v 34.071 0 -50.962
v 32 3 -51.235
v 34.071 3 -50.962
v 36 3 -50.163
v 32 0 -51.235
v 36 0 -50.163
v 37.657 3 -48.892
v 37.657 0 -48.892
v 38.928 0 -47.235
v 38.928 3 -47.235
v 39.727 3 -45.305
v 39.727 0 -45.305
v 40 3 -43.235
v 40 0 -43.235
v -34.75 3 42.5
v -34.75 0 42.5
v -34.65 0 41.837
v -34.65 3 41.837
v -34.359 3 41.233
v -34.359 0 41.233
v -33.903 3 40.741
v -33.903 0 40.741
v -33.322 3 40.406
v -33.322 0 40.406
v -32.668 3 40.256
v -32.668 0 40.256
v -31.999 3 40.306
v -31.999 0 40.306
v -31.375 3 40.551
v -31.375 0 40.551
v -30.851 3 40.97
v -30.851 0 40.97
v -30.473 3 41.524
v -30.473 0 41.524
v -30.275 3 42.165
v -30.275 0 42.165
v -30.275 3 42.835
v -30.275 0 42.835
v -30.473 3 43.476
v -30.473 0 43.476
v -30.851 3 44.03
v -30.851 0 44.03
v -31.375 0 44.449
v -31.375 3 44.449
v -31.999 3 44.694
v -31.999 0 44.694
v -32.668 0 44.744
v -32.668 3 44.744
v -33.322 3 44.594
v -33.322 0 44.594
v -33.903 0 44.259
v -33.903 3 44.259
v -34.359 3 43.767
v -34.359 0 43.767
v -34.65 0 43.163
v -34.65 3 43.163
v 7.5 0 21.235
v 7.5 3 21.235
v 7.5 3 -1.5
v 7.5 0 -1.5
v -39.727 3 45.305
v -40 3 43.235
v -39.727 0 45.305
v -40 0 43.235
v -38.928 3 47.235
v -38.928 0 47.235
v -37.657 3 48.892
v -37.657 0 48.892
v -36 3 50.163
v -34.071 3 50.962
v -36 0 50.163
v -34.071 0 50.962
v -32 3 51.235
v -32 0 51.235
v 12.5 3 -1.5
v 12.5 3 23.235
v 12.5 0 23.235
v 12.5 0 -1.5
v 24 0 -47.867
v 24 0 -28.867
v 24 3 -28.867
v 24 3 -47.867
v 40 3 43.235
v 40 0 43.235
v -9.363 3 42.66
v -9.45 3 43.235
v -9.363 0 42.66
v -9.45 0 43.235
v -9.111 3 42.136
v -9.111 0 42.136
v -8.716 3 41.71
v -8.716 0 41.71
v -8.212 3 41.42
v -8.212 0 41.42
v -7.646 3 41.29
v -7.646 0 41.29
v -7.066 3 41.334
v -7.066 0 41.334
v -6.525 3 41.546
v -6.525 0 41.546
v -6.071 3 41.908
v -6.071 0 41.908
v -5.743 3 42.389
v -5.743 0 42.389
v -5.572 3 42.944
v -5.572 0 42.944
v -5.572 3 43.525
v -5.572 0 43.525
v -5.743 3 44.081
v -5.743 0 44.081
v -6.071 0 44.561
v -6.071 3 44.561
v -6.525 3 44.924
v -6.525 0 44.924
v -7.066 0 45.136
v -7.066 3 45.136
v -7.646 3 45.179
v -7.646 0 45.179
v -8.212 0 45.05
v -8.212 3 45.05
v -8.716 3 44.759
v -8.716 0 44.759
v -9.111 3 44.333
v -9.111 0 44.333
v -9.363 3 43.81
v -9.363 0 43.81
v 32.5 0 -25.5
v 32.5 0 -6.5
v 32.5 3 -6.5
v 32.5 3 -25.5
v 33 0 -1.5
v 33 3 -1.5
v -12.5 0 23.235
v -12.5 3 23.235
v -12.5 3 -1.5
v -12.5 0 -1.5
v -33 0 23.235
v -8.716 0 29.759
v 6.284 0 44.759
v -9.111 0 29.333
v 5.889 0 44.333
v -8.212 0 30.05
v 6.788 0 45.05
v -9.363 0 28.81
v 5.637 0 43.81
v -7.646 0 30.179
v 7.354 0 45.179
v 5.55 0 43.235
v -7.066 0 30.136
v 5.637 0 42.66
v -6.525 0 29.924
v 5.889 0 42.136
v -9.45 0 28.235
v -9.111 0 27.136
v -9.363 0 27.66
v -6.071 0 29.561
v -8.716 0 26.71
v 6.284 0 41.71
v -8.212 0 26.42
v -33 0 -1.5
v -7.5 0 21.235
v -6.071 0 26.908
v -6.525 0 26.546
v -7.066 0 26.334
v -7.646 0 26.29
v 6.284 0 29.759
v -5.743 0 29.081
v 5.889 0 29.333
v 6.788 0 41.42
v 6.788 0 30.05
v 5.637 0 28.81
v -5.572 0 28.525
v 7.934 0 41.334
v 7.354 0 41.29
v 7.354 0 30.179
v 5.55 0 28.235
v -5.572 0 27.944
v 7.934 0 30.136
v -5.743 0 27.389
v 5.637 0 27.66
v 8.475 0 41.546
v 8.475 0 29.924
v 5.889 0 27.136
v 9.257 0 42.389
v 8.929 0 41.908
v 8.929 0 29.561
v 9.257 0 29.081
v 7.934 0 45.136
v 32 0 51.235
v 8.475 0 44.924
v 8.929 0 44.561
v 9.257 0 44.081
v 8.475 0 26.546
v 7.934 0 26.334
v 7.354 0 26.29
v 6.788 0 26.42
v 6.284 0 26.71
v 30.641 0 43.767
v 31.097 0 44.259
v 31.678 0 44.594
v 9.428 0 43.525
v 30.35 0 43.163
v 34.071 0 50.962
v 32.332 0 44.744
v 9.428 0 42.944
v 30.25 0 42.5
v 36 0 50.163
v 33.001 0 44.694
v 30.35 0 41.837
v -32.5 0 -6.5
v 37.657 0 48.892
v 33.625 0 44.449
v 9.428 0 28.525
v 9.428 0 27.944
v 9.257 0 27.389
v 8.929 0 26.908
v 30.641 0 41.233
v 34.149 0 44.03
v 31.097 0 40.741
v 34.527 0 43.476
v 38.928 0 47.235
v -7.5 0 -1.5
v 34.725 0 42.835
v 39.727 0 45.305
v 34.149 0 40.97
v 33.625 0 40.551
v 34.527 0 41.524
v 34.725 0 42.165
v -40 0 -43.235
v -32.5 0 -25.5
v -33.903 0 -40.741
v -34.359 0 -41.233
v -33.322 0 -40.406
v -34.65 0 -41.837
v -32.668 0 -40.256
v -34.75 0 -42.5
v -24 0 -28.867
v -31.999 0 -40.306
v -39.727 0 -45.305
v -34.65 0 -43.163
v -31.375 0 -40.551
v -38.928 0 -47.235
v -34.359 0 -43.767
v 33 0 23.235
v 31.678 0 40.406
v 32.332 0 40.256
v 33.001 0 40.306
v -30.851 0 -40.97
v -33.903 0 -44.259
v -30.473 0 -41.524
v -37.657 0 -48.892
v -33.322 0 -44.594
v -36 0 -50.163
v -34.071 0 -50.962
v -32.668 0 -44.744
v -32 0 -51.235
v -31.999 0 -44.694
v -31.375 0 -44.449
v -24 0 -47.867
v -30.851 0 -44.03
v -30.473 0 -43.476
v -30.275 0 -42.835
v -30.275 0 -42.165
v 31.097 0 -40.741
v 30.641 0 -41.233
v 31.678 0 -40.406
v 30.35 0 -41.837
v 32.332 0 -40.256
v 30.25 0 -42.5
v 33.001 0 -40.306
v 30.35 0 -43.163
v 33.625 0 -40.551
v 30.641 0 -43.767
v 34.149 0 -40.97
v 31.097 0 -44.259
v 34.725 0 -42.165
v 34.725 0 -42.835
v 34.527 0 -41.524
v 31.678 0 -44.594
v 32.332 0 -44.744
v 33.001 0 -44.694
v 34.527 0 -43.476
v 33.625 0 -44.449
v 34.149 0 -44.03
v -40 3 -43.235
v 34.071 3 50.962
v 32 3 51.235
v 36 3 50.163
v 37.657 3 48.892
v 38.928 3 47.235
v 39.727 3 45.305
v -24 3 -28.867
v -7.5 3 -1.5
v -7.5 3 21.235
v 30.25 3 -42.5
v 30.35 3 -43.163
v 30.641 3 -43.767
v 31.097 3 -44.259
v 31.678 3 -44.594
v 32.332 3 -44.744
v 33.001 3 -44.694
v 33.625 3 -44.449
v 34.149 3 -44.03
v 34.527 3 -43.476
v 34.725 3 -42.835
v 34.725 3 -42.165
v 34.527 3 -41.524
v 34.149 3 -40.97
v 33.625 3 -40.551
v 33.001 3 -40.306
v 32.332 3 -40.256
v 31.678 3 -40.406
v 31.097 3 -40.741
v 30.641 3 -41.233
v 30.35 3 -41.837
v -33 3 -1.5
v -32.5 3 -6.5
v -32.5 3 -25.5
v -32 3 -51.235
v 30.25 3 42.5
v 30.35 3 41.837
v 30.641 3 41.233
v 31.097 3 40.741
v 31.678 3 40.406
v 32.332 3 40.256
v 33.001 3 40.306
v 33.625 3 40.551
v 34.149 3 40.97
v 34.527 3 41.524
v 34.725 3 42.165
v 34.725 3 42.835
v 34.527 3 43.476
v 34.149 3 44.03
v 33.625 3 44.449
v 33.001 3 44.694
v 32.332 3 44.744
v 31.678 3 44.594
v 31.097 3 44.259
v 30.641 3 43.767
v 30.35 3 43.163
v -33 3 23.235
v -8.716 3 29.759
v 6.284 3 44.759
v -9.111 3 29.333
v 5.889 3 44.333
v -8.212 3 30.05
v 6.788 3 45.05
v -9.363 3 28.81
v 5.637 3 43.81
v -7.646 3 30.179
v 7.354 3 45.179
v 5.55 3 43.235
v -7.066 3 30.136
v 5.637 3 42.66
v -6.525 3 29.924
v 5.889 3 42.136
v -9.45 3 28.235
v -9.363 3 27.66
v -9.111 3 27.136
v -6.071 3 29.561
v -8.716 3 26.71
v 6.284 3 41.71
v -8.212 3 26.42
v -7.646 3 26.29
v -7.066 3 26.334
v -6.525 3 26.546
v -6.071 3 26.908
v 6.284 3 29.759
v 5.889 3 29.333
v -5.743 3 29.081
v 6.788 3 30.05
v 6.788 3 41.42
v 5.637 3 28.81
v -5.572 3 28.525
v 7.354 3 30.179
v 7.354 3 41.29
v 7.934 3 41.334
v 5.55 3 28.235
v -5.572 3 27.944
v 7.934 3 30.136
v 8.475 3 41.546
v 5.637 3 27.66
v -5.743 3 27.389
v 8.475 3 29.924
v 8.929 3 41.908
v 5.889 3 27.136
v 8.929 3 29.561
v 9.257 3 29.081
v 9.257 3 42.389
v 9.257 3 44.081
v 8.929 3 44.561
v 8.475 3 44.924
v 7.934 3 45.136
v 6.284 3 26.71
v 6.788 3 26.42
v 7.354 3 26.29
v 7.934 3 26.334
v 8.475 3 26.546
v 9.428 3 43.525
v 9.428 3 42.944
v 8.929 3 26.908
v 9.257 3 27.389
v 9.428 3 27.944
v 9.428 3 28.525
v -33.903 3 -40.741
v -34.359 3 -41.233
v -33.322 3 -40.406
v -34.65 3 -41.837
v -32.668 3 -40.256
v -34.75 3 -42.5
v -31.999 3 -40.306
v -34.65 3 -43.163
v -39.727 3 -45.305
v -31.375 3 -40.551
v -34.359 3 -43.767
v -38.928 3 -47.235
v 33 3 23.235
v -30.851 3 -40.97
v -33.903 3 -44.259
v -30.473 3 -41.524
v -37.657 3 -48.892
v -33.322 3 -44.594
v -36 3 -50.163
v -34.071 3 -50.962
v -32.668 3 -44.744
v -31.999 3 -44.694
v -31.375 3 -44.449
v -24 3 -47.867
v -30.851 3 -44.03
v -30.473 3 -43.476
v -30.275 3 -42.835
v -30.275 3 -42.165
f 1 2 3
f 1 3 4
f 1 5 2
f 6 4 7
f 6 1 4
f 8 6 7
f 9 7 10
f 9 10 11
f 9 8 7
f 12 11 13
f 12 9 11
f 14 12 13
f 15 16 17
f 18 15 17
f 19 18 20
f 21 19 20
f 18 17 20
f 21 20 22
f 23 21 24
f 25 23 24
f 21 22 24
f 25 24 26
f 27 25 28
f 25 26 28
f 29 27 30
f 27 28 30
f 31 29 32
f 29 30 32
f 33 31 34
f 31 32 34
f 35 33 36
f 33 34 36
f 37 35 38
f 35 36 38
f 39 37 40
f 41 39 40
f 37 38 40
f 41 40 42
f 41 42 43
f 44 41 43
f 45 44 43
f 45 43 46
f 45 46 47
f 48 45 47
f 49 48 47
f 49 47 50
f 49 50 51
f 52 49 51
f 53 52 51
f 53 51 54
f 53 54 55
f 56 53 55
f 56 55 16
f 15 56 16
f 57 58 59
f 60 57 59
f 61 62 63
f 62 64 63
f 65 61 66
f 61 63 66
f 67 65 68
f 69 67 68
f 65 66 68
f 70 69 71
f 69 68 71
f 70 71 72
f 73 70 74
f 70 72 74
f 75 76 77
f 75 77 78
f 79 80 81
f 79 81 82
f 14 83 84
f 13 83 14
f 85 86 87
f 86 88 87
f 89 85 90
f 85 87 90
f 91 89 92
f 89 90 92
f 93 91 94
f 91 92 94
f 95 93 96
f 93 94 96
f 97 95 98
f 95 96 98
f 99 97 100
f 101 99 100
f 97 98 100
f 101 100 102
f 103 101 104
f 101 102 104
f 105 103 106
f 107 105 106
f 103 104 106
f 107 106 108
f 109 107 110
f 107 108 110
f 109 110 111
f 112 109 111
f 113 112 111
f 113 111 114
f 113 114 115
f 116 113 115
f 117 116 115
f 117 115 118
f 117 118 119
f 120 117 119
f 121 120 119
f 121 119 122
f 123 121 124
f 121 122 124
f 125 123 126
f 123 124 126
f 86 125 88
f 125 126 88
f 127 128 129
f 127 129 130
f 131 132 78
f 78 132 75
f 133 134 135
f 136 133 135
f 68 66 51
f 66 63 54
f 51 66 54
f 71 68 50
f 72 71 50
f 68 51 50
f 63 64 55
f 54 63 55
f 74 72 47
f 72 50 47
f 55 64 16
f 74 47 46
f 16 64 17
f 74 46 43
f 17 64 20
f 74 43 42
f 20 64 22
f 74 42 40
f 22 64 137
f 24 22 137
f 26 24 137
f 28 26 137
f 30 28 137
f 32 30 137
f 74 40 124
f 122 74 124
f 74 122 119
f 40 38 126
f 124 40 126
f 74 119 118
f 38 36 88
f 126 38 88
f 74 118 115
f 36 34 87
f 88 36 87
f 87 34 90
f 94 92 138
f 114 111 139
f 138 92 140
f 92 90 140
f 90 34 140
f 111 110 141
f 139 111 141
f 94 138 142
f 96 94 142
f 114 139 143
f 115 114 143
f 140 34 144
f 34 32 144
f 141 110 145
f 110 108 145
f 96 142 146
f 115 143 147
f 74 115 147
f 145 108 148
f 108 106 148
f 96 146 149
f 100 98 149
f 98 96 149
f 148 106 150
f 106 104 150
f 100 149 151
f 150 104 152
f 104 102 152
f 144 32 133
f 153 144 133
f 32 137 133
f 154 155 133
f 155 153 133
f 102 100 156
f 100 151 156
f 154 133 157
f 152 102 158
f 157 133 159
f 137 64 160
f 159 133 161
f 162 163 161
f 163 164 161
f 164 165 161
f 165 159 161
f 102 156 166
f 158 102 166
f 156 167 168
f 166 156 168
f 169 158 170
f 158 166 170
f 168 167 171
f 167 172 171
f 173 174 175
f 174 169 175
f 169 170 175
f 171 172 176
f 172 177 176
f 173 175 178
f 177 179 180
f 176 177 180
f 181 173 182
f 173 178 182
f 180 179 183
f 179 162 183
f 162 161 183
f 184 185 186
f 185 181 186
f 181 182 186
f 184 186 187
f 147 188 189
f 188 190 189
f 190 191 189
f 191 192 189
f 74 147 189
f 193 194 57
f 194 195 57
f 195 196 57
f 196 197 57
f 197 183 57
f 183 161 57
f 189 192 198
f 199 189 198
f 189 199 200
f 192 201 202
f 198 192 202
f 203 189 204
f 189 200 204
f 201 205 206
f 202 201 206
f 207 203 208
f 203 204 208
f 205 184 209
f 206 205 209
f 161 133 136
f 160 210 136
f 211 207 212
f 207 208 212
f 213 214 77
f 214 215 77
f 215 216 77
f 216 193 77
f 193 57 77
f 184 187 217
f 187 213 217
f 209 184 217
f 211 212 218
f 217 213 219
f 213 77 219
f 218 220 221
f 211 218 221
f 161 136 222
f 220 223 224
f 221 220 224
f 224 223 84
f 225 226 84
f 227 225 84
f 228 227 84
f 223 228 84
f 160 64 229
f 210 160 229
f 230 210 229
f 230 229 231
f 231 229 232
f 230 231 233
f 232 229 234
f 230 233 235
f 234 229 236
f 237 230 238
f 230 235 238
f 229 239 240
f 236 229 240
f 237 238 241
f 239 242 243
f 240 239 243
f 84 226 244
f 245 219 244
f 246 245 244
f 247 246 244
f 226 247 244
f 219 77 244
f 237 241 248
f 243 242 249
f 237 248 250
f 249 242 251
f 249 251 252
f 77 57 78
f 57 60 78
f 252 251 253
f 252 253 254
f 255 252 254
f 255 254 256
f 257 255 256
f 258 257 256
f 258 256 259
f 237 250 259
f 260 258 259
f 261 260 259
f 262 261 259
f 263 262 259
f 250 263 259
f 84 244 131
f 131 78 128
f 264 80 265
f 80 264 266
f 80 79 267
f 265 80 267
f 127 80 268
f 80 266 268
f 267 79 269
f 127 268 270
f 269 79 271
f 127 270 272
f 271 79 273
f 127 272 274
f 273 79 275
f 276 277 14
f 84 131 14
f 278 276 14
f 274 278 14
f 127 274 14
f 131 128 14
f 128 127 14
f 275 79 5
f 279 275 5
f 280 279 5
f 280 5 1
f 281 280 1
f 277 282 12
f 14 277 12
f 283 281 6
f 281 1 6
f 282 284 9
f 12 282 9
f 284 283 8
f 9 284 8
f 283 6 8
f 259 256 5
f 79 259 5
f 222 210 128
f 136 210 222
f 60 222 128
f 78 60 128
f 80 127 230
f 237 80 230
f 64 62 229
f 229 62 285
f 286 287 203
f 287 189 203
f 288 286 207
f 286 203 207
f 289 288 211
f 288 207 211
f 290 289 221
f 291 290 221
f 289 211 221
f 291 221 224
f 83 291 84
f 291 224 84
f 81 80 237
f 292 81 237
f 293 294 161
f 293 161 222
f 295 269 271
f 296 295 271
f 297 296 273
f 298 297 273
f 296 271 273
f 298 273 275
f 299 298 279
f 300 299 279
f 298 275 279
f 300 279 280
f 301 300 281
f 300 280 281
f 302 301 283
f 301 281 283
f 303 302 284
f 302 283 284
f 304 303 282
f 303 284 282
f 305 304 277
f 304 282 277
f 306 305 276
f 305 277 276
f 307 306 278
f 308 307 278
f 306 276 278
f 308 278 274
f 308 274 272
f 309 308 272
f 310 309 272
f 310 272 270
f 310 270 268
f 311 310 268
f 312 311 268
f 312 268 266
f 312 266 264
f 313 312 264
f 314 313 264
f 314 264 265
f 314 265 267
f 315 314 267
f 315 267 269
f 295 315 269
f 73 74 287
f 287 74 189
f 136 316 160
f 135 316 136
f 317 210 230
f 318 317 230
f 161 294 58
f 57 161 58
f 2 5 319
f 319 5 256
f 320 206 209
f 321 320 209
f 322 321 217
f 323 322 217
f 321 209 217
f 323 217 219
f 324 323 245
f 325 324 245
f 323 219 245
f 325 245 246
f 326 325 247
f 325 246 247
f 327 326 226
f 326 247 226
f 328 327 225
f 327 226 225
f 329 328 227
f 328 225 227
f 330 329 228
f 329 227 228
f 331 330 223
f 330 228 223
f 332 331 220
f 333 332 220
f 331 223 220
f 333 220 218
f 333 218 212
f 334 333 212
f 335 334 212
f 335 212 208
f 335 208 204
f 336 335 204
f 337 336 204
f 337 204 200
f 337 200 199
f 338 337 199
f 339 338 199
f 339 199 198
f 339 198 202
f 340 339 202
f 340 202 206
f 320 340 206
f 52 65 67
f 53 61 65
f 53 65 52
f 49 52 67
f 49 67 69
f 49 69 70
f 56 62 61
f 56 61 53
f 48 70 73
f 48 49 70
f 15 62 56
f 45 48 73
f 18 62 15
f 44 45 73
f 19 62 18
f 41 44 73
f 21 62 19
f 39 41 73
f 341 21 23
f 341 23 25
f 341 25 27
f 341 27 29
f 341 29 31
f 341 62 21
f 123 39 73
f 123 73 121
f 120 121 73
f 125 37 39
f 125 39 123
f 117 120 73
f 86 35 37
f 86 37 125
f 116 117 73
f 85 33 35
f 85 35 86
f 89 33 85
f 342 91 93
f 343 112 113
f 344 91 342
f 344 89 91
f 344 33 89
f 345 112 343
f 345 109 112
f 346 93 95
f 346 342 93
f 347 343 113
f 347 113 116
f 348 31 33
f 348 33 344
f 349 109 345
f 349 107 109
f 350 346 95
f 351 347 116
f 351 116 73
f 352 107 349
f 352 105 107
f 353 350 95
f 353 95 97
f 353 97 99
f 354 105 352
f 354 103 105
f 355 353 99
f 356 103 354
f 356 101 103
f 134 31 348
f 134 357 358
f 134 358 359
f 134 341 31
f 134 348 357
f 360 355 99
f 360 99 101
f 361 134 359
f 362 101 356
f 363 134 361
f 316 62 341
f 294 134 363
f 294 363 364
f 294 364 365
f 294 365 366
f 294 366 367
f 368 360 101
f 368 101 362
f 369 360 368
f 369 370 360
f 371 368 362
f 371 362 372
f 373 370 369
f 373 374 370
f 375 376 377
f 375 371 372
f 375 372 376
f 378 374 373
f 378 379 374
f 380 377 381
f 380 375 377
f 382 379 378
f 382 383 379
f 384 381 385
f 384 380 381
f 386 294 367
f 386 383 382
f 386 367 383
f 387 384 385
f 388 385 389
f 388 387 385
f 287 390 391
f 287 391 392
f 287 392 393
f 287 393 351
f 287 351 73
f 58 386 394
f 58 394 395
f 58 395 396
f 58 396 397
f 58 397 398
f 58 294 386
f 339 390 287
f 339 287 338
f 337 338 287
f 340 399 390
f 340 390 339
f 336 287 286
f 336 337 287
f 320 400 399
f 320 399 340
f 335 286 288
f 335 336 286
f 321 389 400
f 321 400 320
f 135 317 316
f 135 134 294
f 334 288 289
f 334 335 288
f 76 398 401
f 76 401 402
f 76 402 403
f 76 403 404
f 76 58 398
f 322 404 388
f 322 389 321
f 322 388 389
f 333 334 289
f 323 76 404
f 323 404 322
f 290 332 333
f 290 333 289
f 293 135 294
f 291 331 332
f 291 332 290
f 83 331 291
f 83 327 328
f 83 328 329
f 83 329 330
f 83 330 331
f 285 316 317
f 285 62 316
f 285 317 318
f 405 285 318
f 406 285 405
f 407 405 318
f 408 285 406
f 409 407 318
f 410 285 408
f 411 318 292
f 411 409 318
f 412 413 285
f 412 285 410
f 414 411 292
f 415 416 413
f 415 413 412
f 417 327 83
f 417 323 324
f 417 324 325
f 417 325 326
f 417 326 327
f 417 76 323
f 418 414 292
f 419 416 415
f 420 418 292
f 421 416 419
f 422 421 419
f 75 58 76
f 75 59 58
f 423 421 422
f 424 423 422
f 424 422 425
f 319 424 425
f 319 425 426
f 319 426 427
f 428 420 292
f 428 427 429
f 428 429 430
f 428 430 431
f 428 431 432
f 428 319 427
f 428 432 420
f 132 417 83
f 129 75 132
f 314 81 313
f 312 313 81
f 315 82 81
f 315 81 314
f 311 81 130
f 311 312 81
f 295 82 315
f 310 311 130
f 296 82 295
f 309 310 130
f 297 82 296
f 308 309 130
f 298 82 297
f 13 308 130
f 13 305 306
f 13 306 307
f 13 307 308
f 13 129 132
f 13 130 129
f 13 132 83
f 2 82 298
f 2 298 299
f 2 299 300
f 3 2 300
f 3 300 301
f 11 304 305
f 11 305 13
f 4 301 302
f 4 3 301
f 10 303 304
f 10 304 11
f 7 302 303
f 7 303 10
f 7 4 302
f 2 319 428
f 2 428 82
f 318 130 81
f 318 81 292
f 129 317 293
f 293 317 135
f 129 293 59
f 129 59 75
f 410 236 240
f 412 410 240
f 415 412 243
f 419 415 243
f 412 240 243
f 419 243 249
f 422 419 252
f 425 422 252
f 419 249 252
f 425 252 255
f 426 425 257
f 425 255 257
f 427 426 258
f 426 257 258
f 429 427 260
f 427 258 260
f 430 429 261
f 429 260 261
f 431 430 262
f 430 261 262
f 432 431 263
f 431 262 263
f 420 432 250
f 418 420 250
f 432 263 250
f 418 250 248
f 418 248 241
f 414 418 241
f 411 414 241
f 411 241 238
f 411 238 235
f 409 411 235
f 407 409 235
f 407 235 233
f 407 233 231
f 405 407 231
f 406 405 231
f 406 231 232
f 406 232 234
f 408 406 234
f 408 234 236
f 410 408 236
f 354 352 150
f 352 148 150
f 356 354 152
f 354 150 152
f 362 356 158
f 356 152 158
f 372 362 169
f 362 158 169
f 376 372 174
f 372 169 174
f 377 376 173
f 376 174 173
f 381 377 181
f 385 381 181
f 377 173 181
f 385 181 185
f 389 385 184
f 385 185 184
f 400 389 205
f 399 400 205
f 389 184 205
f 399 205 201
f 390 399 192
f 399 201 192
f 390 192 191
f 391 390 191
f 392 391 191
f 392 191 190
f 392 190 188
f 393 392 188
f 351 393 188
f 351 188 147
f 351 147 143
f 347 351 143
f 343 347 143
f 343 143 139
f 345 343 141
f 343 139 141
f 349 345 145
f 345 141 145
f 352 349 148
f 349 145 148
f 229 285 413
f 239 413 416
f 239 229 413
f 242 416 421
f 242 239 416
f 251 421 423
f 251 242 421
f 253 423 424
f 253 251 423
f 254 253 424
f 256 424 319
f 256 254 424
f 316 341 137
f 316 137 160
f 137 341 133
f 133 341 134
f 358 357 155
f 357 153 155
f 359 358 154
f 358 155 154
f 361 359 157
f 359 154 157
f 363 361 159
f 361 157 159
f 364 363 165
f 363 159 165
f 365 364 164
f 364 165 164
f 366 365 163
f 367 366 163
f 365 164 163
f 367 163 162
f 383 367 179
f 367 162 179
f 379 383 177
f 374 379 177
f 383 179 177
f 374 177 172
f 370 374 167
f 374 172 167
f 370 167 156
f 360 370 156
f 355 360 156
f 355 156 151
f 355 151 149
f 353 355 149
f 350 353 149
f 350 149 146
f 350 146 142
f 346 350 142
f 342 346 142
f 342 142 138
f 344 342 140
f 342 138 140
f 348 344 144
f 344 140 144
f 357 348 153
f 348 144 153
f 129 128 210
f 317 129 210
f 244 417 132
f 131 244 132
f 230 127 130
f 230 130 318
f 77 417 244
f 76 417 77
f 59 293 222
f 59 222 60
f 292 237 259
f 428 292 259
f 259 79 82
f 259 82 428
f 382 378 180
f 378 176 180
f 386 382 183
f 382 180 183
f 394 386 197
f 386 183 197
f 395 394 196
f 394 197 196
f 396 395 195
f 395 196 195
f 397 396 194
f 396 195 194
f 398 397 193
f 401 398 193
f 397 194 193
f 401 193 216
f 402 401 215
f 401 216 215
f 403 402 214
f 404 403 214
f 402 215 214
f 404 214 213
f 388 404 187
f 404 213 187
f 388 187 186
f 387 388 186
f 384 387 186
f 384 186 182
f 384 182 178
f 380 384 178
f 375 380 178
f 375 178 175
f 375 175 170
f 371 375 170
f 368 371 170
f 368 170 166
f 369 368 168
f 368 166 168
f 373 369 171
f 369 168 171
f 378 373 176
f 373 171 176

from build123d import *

# Parameters (mm, degrees)
ESQUISSE1_R             = 65
DISQUE_DEPTH            = 3
ESQUISSE3_W             = 30.466369815
ESQUISSE3_H             = 200
COT_S_DEPTH             = 4
D_GAGEMENT_M42_D        = 4.5
ESQUISSE15_W            = 89.863216067
ESQUISSE15_H            = 32.096215679
ENL_V_MAT_EXTRU_1_DEPTH = 4
EMPLACEMENT_COMPOS_W    = 48
EMPLACEMENT_COMPOS_H    = 19
EMPLACEMENT_COMPOS_W_2  = 65
EMPLACEMENT_COMPOS_W_3  = 120.200529509
EMPLACEMENT_COMPOS_H_2  = 30.626013932
ENL_V_MAT_EXTRU_2_DEPTH = 4
CONG_1_R                = 8
D_GAGEMENT_M3_51_D      = 3.9
D_GAGEMENT_M3_51_DEPTH  = 3
D_GAGEMENT_M3_51_TIP    = 1.171678207
ESQUISSE19_W            = 20.5
ESQUISSE19_H            = 24.73475383
ENL_V_MAT_EXTRU_3_DEPTH = 4
ESQUISSE22_W            = 15
ESQUISSE22_H            = 22.73475383
ENL_V_MAT_EXTRU_4_DEPTH = 4


with BuildPart() as part:
    # Esquisse1 → disque (new body)
    with BuildSketch(Plane(origin=(0, 0, 0), x_dir=(1, 0, 0), z_dir=(0, 1, 0))):
        Circle(ESQUISSE1_R)
    extrude(amount=DISQUE_DEPTH)

    # Esquisse3 → cotés (cut, through all)
    with BuildSketch(Plane(origin=(0, 3, 0), x_dir=(1, 0, 0), z_dir=(0, 1, 0))):
        with Locations((-55.233184908, 0)):
            Rectangle(ESQUISSE3_W, ESQUISSE3_H)
        with Locations((55.233184908, 0)):
            Rectangle(ESQUISSE3_W, ESQUISSE3_H)
    extrude(amount=-COT_S_DEPTH, mode=Mode.SUBTRACT)

    # Dégagement M42 (through all)
    with Locations(Plane(origin=(0, 3, 0), x_dir=(1, 0, 0), z_dir=(0, 1, 0))):
        with Locations((-32.5, 42.5), (32.5, 42.5), (32.5, -42.5), (-32.5, -42.5)):
            Hole(D_GAGEMENT_M42_D / 2)

    # Esquisse15 → Enlèv. mat.-Extru.1 (cut, through all)
    with BuildSketch(Plane.XZ):
        with Locations((-4.931608034, 67.282861669)):
            Rectangle(ESQUISSE15_W, ESQUISSE15_H)
    extrude(amount=-ENL_V_MAT_EXTRU_1_DEPTH, mode=Mode.SUBTRACT)

    # emplacement compos → Enlèv. mat.-Extru.2 (cut, through all)
    with BuildSketch(Plane(origin=(0, 0, 0), x_dir=(-1, 0, 0), z_dir=(0, -1, 0))):
        with Locations((0, 38.367376915)):
            Rectangle(EMPLACEMENT_COMPOS_W, EMPLACEMENT_COMPOS_H)
        with Locations((0, 16)):
            Rectangle(EMPLACEMENT_COMPOS_W_2, EMPLACEMENT_COMPOS_H)
        with Locations((-20.100264755, 66.547760796)):
            Rectangle(EMPLACEMENT_COMPOS_W_3, EMPLACEMENT_COMPOS_H_2)
    extrude(amount=-ENL_V_MAT_EXTRU_2_DEPTH, mode=Mode.SUBTRACT)

    # Congé1
    cong_1_edges = [part.edges().sort_by_distance(p)[0] for p in [
        (40, 1.5, -51.23475383),
        (40, 1.5, 51.23475383),
        (-40, 1.5, 51.23475383),
        (-40, 1.5, -51.23475383),
    ]]
    fillet(cong_1_edges, radius=CONG_1_R)

    # Dégagement M3.51
    with Locations(Plane(origin=(0, 3, 0), x_dir=(1, 0, 0), z_dir=(0, 1, 0))):
        with Locations((-7.5, -28.23475383), (7.5, -28.23475383), (7.5, -43.23475383), (-7.5, -43.23475383)):
            Hole(D_GAGEMENT_M3_51_D / 2, depth=D_GAGEMENT_M3_51_DEPTH)
            with Locations((0, 0, -(D_GAGEMENT_M3_51_DEPTH + D_GAGEMENT_M3_51_TIP / 2))):  # 118° drill point
                Cone(0, D_GAGEMENT_M3_51_D / 2, D_GAGEMENT_M3_51_TIP, mode=Mode.SUBTRACT)

    # Esquisse19 → Enlèv. mat.-Extru.3 (cut, through all)
    with BuildSketch(Plane(origin=(0, 3, 0), x_dir=(1, 0, 0), z_dir=(0, 1, 0))):
        with Locations((-22.75, -10.867376915)):
            Rectangle(ESQUISSE19_W, ESQUISSE19_H)
    enl_v_mat_extru_3 = extrude(amount=-ENL_V_MAT_EXTRU_3_DEPTH, mode=Mode.SUBTRACT)

    # Symétrie1: Enlèv. mat.-Extru.3 across plane
    add(enl_v_mat_extru_3.mirror(Plane.ZY), mode=Mode.SUBTRACT)

    # Esquisse22 → Enlèv. mat.-Extru.4 (cut, through all)
    with BuildSketch(Plane(origin=(0, 3, 0), x_dir=(1, 0, 0), z_dir=(0, 1, 0))):
        with Locations((0, -9.867376915)):
            Rectangle(ESQUISSE22_W, ESQUISSE22_H)
    extrude(amount=-ENL_V_MAT_EXTRU_4_DEPTH, mode=Mode.SUBTRACT)


solid = part.part
